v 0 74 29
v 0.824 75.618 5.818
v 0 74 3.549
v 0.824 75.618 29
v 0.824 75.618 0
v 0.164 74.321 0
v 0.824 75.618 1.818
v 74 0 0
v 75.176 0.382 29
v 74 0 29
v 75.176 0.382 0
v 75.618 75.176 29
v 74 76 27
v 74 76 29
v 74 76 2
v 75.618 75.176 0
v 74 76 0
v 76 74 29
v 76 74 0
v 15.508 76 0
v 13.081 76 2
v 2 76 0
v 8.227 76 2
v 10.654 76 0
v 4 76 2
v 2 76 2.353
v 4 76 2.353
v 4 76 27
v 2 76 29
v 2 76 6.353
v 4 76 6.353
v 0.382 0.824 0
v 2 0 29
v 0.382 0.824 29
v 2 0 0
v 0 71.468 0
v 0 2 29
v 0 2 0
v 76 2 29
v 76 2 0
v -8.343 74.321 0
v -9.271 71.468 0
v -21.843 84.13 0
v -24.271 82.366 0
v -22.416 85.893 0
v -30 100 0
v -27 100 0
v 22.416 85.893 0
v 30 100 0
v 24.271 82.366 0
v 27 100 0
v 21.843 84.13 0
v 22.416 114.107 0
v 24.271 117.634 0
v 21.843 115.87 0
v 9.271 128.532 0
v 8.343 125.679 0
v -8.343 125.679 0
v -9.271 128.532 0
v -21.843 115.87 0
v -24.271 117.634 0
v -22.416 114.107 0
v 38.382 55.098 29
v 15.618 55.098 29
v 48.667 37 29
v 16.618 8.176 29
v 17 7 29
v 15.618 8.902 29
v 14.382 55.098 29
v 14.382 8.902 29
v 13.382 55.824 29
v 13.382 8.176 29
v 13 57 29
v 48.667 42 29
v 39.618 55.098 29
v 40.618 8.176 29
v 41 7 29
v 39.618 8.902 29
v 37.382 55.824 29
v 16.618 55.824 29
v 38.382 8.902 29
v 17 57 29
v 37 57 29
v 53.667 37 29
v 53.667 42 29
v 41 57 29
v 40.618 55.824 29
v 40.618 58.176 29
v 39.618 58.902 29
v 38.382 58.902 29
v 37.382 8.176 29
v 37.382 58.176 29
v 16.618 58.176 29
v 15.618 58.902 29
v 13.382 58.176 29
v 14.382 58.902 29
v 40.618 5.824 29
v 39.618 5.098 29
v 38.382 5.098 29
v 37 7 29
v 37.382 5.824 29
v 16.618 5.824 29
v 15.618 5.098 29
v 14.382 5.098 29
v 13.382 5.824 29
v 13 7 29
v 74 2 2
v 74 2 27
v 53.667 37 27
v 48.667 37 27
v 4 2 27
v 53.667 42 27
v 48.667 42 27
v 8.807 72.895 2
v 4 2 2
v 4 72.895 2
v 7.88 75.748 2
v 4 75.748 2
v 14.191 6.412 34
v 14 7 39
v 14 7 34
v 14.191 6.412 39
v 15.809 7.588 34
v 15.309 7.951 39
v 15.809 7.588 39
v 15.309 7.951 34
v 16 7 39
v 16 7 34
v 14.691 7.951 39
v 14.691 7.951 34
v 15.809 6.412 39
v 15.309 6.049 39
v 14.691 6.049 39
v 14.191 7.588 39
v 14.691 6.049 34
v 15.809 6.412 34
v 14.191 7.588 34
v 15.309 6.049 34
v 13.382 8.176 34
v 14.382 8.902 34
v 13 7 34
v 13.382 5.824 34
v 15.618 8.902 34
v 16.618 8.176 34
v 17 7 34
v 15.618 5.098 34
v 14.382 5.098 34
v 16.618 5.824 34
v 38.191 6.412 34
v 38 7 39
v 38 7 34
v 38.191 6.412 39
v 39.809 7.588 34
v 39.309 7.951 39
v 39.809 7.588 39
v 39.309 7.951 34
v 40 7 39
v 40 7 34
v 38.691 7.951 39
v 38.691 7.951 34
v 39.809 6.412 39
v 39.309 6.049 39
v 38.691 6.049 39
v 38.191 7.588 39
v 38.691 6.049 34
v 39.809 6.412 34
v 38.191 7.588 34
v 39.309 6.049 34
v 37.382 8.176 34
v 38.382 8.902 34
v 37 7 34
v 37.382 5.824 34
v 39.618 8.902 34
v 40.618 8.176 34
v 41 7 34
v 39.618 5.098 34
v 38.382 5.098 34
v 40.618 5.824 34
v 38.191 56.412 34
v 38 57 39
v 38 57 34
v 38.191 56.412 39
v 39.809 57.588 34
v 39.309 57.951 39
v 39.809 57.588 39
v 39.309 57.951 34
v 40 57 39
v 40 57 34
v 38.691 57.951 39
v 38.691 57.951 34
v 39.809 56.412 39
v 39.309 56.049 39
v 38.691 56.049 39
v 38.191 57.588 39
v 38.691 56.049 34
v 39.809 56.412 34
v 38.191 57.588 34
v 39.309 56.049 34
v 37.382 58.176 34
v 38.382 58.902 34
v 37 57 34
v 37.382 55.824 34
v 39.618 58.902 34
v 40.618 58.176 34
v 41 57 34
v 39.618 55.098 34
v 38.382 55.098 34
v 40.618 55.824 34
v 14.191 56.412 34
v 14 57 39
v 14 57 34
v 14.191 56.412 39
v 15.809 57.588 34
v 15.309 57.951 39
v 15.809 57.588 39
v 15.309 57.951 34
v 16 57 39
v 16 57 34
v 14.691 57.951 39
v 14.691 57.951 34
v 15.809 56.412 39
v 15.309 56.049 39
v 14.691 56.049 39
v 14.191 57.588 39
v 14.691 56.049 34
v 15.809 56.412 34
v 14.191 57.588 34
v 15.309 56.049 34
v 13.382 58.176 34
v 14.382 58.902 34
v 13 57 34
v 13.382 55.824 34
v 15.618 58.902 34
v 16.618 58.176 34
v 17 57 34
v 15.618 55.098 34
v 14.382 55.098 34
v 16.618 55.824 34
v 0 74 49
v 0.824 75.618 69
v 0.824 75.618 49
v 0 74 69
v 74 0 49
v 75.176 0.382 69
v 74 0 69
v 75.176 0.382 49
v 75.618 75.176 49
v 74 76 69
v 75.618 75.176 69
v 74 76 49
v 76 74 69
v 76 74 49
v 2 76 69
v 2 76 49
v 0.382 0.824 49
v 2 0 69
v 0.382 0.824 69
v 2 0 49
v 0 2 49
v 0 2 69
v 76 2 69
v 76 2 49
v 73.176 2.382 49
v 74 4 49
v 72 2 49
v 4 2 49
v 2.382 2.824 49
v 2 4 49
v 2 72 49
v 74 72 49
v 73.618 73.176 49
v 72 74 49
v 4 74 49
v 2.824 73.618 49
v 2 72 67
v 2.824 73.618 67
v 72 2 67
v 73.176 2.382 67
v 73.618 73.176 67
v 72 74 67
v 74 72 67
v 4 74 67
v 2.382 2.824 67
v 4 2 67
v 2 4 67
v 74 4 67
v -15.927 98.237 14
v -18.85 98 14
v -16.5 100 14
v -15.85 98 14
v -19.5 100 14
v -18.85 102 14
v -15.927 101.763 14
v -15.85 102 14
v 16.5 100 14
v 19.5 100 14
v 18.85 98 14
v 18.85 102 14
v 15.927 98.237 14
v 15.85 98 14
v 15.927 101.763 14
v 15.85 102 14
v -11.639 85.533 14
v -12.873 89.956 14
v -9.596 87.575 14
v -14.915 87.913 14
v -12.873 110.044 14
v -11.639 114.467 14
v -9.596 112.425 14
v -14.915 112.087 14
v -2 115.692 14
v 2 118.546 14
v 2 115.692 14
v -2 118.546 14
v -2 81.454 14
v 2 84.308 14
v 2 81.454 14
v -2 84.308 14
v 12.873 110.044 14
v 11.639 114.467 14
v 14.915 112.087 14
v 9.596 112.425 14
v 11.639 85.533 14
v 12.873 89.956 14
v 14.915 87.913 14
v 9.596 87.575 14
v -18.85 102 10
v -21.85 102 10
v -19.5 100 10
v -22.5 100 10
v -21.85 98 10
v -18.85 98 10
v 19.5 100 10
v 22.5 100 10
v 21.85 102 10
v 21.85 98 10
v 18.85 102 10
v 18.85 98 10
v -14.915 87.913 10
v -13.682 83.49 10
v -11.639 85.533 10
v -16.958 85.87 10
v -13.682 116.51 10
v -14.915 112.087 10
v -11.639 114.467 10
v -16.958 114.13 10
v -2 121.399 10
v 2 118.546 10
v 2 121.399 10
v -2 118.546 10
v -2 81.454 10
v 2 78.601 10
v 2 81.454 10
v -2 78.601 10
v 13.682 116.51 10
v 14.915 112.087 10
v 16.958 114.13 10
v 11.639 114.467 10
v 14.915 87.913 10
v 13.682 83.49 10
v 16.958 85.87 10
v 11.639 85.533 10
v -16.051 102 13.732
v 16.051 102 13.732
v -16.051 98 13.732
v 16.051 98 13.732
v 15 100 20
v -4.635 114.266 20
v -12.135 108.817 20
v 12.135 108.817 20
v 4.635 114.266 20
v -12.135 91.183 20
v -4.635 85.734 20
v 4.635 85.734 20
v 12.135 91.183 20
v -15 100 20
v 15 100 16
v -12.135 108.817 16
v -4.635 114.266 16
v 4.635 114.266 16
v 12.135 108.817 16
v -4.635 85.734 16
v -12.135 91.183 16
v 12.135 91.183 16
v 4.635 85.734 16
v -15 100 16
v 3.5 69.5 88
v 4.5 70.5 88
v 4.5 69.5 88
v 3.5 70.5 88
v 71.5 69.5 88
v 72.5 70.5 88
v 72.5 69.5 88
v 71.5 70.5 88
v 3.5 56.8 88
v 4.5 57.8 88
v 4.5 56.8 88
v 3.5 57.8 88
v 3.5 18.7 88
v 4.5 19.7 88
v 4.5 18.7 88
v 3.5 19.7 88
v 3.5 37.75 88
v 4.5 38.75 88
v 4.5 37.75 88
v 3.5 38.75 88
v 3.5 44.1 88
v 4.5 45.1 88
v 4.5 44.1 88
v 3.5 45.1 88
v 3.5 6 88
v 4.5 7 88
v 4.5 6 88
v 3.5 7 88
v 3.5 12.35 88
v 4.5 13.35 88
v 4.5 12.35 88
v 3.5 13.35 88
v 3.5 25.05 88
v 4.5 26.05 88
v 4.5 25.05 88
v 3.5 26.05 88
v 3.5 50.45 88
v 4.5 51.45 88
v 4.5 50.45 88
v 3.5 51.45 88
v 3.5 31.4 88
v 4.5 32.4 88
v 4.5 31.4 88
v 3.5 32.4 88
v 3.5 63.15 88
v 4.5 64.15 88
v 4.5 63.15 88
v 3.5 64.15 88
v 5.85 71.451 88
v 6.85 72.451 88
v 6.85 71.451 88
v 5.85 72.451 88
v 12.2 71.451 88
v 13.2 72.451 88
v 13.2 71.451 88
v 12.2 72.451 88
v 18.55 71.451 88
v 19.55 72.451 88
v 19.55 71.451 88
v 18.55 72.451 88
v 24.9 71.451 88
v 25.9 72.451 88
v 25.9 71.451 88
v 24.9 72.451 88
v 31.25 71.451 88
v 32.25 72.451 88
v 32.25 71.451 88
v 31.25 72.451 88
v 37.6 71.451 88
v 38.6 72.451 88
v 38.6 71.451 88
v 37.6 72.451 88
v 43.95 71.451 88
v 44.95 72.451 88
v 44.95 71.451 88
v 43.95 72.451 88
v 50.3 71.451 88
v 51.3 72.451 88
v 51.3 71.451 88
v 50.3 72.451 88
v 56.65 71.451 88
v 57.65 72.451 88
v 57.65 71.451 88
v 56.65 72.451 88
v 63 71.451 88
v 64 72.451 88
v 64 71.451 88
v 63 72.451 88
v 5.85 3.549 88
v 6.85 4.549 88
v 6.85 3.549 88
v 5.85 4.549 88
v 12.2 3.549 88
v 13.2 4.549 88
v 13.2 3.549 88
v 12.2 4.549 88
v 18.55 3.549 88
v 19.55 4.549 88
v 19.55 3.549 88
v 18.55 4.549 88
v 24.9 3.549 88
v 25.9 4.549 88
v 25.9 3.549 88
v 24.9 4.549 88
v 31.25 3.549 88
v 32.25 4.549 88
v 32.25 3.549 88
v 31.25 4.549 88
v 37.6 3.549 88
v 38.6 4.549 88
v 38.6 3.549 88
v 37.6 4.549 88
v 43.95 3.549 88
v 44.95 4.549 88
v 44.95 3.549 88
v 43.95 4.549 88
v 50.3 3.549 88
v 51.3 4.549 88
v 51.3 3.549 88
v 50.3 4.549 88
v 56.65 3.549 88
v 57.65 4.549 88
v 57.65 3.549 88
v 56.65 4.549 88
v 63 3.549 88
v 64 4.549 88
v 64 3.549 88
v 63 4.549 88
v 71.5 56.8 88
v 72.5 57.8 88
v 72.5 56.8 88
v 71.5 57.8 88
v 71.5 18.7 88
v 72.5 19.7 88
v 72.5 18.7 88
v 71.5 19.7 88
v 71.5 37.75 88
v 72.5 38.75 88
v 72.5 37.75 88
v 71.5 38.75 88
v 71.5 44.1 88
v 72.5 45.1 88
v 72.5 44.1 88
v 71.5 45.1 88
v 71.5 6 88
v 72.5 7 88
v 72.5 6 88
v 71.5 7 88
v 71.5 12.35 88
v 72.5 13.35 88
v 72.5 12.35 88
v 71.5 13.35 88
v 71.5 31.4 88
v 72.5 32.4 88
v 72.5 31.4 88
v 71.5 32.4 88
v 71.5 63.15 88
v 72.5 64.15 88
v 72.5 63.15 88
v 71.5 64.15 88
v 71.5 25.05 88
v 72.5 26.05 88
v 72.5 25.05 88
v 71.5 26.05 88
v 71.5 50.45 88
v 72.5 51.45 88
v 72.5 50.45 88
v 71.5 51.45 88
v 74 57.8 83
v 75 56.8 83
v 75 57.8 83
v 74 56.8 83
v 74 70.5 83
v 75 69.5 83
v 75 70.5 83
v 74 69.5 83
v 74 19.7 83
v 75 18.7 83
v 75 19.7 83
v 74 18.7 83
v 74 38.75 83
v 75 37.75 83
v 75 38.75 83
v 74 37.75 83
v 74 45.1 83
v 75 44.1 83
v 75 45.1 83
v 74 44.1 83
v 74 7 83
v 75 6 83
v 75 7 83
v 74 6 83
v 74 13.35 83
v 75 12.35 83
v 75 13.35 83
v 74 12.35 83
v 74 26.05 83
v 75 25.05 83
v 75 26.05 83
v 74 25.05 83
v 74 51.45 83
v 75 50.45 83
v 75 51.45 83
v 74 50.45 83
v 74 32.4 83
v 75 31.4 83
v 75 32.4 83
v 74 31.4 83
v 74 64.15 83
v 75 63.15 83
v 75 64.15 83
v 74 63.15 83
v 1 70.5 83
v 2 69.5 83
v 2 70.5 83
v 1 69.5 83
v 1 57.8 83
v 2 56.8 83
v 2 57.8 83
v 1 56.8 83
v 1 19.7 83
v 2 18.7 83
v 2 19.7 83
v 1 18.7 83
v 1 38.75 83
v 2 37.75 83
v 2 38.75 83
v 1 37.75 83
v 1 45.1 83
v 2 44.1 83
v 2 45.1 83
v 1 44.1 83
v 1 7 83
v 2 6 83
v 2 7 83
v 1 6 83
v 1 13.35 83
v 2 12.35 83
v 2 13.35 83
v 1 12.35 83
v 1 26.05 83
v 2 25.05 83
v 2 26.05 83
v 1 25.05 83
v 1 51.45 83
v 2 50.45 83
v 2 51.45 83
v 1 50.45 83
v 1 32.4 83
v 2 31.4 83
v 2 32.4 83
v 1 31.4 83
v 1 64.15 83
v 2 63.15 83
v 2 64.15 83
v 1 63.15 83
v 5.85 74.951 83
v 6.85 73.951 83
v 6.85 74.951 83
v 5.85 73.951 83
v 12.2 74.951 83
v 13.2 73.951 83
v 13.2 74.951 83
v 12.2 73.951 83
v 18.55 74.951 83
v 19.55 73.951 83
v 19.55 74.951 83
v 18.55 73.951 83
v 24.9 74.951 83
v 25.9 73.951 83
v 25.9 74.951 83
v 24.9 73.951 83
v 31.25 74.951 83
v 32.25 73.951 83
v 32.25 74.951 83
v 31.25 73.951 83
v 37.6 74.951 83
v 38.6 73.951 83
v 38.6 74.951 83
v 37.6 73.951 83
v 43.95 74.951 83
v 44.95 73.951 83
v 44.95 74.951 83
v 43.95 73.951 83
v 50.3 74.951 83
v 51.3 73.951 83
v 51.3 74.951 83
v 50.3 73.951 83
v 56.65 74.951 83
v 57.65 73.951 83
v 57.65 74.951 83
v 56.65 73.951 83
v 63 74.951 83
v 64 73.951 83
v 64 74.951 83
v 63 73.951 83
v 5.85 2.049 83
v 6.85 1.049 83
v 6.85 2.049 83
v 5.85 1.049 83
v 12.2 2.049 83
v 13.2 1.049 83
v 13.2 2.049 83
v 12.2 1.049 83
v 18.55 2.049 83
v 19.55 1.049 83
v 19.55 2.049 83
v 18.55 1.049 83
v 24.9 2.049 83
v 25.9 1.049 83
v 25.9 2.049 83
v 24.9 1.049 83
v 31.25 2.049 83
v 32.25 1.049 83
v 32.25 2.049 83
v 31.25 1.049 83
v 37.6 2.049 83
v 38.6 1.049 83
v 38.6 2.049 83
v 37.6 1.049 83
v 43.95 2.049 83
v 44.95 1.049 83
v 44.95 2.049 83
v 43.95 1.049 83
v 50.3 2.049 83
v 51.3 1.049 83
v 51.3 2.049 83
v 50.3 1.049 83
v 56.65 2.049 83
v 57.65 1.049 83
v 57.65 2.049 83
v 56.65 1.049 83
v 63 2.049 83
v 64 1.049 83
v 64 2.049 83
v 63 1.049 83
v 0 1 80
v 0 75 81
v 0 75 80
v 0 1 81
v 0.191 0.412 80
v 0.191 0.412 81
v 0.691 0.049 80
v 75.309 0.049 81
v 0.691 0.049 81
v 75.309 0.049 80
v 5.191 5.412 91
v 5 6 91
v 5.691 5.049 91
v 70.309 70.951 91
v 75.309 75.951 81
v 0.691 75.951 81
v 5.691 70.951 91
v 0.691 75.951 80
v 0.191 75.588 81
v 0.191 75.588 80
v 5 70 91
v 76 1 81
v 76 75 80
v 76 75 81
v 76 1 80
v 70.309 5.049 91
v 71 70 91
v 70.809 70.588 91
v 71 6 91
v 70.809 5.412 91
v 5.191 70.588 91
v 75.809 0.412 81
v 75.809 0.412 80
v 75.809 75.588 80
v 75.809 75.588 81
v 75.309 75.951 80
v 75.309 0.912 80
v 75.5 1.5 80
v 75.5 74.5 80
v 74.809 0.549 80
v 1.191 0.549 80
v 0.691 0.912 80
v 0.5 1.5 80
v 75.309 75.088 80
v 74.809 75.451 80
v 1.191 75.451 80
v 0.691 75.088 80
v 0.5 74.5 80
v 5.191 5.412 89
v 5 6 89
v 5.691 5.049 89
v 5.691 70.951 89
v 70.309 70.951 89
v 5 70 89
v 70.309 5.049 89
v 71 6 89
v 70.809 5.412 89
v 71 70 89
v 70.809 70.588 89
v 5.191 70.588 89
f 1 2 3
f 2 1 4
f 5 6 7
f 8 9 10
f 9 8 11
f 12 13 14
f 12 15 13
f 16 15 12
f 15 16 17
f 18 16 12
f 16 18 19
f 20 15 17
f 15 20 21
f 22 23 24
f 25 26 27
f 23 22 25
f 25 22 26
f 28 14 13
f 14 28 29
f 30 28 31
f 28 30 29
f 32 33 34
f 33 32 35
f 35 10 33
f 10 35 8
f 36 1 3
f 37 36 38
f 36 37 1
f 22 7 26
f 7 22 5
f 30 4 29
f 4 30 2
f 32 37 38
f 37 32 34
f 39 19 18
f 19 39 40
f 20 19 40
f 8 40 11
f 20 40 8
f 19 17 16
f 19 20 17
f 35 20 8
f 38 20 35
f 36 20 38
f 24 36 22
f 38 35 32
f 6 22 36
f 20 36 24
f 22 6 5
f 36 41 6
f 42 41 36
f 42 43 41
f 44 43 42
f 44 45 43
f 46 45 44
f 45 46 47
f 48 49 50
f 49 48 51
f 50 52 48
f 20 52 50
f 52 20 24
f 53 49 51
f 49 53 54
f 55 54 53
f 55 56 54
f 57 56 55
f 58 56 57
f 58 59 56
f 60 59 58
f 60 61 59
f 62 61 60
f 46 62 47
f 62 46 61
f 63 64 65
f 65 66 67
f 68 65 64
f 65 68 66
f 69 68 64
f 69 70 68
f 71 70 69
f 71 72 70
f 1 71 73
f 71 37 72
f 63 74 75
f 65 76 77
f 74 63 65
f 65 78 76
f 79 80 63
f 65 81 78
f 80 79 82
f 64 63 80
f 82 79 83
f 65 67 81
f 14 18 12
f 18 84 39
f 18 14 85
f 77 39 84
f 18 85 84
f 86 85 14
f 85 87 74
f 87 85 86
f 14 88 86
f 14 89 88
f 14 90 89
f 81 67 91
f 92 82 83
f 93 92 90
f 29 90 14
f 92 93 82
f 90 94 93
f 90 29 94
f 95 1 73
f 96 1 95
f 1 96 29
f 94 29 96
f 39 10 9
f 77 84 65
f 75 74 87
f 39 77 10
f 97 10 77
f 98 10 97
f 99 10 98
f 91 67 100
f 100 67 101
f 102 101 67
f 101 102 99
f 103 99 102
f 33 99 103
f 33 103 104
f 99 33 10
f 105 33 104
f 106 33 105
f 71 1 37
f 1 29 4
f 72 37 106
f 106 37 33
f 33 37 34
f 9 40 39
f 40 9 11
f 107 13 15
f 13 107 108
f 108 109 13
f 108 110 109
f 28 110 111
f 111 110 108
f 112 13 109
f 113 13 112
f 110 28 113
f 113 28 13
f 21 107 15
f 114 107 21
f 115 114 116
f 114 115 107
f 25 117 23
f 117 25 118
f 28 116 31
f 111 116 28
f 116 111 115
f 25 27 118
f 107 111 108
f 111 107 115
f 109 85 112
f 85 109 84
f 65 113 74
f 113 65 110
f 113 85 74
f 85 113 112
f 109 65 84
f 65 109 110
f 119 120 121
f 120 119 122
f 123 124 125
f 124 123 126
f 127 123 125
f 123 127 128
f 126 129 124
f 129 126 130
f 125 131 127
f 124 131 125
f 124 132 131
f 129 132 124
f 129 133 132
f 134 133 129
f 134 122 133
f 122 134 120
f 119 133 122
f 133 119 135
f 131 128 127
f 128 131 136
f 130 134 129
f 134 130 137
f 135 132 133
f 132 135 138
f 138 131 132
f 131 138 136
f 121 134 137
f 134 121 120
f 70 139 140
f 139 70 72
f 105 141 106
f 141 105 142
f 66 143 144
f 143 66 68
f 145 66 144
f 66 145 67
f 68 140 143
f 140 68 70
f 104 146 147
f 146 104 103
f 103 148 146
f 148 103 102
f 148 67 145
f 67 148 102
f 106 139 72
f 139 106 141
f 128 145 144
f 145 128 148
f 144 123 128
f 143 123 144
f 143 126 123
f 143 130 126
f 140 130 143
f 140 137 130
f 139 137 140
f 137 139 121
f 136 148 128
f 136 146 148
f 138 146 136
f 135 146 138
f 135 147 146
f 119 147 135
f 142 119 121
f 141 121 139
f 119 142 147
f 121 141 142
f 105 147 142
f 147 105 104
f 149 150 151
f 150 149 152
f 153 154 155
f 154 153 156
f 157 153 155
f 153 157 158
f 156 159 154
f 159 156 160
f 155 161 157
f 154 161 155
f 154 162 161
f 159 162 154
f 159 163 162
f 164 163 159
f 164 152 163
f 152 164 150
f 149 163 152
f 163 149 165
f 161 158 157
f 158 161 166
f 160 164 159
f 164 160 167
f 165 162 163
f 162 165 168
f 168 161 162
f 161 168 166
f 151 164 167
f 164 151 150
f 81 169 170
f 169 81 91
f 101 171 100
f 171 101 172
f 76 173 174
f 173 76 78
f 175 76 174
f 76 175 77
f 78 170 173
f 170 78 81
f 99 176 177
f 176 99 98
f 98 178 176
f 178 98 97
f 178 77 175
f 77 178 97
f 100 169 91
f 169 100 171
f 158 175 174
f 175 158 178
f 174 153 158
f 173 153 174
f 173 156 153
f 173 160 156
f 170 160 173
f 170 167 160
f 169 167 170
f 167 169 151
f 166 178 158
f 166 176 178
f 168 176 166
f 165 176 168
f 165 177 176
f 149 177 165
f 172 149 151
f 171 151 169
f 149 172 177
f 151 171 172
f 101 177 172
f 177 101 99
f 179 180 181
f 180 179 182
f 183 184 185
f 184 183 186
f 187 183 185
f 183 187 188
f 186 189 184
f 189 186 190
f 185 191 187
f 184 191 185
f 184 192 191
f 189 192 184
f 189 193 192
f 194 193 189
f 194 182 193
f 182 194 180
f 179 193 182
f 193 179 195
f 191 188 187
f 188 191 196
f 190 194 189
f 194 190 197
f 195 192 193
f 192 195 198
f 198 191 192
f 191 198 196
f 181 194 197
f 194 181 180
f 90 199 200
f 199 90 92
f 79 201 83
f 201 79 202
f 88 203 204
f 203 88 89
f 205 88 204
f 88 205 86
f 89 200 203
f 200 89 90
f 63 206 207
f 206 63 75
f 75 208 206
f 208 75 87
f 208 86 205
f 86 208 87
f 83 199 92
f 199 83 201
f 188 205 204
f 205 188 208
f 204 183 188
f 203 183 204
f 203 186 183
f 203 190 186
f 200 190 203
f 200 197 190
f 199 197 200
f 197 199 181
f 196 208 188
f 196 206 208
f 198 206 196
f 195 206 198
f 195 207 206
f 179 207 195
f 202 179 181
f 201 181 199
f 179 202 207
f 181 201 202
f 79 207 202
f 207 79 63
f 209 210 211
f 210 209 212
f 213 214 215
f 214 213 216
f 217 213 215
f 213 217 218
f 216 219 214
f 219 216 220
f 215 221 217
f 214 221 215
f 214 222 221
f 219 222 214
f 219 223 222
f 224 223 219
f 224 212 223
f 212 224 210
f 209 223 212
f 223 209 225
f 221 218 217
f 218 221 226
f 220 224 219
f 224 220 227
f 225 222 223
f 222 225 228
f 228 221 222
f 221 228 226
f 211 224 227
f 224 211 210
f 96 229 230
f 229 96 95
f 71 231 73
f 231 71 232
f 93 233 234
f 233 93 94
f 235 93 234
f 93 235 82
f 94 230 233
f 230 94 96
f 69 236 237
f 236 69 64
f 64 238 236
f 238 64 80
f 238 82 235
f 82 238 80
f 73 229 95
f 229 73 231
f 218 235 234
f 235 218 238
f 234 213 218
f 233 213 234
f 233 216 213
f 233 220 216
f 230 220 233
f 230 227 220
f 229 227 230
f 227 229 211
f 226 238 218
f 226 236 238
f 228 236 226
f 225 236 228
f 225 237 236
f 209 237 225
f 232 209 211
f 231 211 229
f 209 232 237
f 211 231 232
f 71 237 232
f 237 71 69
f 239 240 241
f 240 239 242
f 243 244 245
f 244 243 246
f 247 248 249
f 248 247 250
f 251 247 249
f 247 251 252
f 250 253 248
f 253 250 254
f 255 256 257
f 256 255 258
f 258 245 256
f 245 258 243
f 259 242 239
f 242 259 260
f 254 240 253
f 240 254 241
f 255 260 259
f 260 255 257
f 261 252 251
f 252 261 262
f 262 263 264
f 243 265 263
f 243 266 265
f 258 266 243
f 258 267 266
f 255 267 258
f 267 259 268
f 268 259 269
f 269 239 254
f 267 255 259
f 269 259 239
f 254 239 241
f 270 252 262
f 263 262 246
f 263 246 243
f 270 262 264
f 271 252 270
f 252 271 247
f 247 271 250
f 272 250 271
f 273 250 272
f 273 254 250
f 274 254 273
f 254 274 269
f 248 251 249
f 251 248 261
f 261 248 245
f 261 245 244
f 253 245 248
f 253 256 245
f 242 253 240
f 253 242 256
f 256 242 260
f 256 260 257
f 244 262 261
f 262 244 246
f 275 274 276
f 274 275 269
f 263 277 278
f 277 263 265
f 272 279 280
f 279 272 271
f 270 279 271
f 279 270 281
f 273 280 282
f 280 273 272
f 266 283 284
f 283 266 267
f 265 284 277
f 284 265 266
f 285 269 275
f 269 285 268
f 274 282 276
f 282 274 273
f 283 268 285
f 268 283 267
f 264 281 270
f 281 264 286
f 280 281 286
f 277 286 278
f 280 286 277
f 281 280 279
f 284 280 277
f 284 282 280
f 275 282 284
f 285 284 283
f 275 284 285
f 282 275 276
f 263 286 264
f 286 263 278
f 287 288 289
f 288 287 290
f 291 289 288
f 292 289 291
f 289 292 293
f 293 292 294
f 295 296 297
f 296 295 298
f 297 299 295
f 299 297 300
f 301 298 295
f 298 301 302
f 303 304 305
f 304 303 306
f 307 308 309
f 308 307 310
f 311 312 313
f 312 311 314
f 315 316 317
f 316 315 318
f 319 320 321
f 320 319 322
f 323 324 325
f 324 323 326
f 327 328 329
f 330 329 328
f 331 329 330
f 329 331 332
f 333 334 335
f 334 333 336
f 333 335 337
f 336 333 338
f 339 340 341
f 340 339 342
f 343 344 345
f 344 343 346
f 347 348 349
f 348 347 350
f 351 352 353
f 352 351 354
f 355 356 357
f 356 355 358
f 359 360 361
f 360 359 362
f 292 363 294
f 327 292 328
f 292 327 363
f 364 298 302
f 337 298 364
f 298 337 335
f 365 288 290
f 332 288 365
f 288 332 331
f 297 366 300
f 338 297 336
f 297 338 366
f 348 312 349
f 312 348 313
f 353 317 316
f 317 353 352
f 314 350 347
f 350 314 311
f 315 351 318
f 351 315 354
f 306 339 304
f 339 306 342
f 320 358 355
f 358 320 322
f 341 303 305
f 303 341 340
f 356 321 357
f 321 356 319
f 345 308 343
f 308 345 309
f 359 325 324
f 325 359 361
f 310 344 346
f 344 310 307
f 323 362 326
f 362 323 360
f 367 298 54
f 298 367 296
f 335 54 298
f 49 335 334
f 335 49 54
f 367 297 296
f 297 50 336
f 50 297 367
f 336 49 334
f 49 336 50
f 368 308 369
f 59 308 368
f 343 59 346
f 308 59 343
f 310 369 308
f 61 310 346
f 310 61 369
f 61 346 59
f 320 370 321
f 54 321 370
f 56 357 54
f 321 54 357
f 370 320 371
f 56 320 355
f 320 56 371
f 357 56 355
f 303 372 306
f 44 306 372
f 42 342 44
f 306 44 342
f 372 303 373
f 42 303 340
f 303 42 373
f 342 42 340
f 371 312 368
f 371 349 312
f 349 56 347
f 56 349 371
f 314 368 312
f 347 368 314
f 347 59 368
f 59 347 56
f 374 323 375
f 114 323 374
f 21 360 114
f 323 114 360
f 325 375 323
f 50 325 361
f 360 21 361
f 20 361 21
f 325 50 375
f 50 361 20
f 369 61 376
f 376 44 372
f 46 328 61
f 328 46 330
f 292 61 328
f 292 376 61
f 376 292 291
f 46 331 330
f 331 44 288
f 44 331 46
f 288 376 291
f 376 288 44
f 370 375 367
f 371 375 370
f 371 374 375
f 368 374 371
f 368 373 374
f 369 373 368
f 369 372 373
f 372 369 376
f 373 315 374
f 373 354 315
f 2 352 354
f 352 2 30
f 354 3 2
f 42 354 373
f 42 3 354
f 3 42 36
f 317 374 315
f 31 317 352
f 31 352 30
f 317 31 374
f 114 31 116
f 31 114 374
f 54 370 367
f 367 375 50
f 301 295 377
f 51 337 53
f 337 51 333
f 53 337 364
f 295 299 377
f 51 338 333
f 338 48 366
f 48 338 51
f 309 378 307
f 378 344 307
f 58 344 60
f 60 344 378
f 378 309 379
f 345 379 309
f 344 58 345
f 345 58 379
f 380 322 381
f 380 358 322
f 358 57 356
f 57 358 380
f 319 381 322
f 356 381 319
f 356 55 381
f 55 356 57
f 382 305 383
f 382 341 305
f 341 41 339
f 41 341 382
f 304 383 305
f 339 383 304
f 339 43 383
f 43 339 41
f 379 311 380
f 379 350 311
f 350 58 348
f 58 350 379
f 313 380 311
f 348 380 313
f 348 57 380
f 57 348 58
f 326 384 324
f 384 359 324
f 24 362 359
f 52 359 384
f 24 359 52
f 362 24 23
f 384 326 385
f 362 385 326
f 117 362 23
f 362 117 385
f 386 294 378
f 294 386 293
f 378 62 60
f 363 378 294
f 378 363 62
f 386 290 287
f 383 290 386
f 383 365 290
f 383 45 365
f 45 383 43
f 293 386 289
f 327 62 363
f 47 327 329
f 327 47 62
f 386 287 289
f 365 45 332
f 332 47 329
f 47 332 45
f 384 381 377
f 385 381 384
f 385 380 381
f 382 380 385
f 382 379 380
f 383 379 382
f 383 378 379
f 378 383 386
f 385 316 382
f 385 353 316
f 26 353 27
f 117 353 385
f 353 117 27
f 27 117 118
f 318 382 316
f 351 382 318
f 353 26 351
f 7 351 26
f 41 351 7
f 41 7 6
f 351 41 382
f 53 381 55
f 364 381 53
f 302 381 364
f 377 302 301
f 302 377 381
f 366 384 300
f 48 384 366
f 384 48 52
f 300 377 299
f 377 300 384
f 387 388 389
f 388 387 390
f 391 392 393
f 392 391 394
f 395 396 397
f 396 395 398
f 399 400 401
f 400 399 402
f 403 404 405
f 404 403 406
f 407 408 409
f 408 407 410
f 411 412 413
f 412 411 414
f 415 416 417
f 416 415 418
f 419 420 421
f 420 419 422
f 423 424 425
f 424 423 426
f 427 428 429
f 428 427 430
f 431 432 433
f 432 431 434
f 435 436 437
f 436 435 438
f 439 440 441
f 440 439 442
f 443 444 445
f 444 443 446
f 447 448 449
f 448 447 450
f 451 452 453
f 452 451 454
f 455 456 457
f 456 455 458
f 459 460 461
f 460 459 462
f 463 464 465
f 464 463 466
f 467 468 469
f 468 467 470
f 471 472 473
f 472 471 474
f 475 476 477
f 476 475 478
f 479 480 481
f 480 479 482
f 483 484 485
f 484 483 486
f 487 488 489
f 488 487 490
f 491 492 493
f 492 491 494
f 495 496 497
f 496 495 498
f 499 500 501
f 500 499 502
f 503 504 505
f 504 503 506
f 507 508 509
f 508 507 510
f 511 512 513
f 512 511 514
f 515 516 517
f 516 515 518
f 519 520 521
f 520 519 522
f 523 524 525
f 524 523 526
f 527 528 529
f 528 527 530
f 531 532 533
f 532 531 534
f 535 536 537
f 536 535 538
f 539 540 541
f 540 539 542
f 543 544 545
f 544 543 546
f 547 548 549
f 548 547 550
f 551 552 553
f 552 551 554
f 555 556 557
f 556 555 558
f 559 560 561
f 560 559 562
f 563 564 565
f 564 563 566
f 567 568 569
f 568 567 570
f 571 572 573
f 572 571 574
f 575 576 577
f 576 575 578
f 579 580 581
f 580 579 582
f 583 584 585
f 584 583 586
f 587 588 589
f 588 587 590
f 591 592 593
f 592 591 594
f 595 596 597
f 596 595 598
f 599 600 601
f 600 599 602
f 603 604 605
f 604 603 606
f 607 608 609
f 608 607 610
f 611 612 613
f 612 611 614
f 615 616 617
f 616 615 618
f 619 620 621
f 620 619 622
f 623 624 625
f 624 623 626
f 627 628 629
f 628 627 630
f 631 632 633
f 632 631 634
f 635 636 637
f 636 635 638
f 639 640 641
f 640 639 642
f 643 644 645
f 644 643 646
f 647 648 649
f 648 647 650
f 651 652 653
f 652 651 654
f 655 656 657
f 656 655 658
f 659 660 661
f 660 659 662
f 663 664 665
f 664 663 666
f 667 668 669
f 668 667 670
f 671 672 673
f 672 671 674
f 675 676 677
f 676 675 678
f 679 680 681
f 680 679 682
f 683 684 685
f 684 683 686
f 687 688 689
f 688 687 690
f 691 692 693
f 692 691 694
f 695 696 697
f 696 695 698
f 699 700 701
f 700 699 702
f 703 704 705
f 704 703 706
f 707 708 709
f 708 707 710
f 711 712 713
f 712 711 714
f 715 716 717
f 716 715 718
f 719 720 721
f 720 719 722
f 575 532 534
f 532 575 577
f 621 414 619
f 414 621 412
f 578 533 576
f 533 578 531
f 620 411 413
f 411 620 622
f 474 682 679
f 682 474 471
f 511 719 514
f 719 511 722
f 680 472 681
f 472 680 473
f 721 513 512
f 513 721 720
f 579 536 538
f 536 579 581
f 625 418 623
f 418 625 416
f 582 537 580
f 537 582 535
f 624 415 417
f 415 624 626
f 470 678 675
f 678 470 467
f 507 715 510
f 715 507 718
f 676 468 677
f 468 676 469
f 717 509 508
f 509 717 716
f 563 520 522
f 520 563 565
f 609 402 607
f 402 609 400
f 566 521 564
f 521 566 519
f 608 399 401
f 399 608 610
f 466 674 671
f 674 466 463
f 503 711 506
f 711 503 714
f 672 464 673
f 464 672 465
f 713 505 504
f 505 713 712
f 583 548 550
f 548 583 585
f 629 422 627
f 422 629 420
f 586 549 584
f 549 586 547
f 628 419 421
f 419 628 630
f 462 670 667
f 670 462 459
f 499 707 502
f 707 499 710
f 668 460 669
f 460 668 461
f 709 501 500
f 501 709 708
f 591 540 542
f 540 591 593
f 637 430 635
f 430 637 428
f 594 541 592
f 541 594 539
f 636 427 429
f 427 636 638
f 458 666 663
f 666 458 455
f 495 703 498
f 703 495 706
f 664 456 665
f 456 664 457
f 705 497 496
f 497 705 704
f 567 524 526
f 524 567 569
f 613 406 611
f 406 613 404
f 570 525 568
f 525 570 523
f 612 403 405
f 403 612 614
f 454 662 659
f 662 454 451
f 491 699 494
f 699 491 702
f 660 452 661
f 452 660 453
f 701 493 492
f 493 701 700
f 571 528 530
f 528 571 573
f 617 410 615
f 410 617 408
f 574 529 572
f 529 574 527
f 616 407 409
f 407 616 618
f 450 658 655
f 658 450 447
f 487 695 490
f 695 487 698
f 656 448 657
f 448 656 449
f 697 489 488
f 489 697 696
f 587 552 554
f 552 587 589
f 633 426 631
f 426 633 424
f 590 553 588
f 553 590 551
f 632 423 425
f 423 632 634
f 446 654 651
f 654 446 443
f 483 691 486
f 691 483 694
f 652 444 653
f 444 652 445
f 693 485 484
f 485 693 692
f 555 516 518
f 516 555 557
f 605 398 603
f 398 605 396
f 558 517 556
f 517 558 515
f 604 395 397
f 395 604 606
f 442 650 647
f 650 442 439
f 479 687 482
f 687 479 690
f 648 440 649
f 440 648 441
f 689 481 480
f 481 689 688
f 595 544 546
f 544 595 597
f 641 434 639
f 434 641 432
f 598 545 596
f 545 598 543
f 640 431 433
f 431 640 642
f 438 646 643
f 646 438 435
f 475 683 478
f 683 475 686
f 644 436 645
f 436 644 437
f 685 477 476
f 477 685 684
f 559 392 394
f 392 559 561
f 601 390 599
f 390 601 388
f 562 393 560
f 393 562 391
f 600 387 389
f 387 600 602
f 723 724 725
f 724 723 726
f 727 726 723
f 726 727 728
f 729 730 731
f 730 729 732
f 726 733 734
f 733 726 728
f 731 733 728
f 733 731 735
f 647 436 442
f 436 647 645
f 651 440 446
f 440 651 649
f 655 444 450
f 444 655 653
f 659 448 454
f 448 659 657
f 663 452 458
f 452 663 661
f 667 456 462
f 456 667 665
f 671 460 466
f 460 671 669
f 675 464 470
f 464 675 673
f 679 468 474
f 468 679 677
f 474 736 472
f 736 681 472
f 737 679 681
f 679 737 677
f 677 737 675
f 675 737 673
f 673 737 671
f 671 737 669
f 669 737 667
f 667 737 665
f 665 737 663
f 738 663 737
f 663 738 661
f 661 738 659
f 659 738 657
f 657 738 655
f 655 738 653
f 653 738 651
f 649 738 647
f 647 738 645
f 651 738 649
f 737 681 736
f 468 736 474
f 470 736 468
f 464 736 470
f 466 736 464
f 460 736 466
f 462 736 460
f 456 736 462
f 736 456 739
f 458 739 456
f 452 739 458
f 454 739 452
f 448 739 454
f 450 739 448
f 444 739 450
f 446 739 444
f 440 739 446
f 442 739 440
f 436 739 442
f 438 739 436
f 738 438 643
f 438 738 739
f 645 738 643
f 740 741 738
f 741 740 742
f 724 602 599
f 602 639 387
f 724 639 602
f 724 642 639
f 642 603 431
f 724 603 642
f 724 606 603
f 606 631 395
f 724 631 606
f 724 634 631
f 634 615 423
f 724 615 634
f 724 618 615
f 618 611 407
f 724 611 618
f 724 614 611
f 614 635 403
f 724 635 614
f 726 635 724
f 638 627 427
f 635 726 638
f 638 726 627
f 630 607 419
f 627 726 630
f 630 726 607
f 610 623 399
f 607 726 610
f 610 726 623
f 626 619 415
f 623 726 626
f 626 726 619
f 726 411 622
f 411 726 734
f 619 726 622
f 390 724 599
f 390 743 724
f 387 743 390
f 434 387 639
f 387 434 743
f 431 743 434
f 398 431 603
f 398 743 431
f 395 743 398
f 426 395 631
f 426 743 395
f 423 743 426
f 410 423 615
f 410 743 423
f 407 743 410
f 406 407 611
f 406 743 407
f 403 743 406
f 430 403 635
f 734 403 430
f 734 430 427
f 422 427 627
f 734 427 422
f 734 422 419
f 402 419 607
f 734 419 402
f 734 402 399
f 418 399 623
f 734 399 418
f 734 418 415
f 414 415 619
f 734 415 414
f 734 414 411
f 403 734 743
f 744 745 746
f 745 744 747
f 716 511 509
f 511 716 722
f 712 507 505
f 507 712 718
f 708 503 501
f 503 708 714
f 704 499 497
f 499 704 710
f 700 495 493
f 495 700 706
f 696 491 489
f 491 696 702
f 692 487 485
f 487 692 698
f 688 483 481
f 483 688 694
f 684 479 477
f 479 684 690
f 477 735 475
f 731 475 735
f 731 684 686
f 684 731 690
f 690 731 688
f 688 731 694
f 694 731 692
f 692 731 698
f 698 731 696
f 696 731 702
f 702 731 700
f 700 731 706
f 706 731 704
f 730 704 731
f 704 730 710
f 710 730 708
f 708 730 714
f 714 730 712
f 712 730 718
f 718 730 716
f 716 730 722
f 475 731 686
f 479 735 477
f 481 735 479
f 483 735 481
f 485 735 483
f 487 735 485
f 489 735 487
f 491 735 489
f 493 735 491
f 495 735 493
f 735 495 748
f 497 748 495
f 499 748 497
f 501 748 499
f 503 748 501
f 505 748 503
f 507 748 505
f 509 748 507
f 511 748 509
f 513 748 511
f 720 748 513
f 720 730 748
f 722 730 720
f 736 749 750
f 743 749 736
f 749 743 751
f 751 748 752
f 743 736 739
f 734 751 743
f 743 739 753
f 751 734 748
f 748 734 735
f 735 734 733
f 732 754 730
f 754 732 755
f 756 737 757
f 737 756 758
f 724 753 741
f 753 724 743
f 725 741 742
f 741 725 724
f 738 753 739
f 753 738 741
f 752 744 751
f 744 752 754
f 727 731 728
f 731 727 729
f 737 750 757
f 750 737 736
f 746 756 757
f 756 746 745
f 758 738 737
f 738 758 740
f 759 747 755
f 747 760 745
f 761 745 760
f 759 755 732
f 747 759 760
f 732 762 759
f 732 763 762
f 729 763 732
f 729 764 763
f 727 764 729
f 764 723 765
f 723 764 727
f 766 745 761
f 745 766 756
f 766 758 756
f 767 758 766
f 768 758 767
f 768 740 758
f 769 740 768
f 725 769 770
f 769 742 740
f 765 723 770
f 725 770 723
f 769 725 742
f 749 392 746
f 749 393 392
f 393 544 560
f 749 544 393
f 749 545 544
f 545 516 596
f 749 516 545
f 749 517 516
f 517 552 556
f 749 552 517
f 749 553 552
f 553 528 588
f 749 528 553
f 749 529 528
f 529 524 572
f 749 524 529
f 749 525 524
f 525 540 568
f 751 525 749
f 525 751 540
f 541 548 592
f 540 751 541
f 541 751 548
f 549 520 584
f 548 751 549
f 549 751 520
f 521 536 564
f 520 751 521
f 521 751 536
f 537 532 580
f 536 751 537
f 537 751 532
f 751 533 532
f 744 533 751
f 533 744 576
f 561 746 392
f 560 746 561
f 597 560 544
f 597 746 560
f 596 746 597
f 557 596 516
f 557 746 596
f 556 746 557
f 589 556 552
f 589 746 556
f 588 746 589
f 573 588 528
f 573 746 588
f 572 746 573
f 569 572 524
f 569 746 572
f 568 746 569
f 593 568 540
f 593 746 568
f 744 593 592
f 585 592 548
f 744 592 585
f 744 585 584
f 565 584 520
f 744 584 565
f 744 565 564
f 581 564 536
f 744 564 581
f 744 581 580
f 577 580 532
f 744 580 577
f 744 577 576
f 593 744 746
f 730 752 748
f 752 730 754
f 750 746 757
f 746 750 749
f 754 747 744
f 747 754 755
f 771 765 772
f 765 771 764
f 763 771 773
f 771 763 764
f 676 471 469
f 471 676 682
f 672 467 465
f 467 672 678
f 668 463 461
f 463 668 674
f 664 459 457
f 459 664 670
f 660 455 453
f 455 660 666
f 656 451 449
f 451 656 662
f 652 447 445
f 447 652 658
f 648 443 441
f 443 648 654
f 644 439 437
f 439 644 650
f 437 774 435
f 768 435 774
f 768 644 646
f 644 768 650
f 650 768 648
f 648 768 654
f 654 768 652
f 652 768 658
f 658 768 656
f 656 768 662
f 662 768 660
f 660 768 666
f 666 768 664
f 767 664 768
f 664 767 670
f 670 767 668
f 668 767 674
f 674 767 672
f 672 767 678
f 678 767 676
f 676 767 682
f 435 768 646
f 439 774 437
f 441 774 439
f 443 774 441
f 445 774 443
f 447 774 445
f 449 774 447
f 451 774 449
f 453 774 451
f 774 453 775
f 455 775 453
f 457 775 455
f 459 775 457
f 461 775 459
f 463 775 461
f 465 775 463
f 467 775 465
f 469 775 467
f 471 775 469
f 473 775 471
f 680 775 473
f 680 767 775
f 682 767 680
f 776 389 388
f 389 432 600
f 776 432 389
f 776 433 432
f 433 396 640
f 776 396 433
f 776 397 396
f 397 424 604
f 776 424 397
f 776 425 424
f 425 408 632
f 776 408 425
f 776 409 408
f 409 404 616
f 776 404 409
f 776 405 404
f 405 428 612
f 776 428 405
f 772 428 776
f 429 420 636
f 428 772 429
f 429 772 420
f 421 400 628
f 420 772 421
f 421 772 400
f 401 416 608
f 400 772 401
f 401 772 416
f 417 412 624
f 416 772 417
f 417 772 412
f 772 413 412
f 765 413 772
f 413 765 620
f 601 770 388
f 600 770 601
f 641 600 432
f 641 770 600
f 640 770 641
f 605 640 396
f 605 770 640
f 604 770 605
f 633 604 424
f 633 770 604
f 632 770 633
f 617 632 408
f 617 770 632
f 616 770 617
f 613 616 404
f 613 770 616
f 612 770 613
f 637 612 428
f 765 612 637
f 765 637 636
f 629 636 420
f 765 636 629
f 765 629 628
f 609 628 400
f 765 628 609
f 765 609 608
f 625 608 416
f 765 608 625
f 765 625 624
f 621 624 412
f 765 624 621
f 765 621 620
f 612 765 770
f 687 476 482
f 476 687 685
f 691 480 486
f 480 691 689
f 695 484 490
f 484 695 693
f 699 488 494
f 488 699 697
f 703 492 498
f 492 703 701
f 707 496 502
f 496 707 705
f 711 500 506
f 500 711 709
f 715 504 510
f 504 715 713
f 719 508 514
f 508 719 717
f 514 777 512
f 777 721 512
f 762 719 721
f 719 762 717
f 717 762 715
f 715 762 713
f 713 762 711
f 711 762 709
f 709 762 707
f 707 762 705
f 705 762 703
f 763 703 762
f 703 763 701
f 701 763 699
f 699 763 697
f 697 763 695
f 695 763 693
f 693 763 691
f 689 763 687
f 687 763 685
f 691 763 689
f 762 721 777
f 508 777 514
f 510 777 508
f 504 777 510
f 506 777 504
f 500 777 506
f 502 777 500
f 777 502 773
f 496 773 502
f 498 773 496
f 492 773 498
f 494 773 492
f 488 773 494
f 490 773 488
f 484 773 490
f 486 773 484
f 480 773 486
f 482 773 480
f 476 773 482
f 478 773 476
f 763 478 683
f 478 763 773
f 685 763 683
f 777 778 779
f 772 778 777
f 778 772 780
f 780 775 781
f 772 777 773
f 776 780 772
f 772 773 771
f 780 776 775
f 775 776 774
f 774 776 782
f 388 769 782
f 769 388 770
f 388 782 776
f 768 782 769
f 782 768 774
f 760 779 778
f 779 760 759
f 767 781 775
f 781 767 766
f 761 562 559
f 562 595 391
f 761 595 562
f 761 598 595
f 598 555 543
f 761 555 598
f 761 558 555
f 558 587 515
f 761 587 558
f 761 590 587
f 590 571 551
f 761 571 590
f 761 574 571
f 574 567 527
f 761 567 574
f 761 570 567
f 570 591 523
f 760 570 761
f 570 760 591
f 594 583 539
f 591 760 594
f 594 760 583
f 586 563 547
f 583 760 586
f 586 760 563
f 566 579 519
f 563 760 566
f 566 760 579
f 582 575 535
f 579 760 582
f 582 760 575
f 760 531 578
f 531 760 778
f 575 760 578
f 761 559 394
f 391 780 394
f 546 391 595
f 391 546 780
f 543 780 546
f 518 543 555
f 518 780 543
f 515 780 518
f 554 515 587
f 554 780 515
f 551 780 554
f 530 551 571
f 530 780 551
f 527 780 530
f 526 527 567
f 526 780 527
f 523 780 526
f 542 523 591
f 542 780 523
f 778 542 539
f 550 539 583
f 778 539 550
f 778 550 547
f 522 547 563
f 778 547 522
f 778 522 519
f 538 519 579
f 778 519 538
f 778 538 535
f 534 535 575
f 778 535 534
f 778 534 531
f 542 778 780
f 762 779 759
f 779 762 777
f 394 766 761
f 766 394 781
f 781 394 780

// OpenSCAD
$fn = 10;
// size of battery module
bat = [70, 70, 25];

nodemcu_size = [30, 56];
// 2mm border (for each side)
border = 2;
// cap height
cap = [0, 20, 0];

// for debug purpose
cap_offset = 20;

module cpu_pilar(x, y) {
  color("blue")
  translate([x, y, 0])
  union() {
    cylinder(h=10, r=1, center=false);
    cylinder(h=5, r=2, center=false);
  }
}
module battery_bed() {
difference() {
      // make nice round casing
      linear_extrude(bat.z + border*2)
      offset(r = border)
      square(bat.x + border);
        
      translate([border, 0, border])
      cube(bat + [0, 100, 0]);
      // hole for power cords
      // ensure we don't clip bottom
      translate(bat - [bat.x/3, bat.y/2, 0])
      cube([5, 5, 1000]);
    }
}

module cpu_bed() {
  union() {
      // just for preview
      //square(nodemcu_size);
      // support pilars at corners
      cpu_pilar(3, 3);
      cpu_pilar(nodemcu_size.x - 3, 3);
      cpu_pilar(nodemcu_size.x - 3, nodemcu_size.y - 3);
      cpu_pilar(3, nodemcu_size.y - 3);
    }
}

module cpu_cap() {
            // cap on cpu
        difference() {
        color("purple")
        linear_extrude(cap.y)
        offset(r = border)
        square(bat.x + border);
        color("magenta")
        translate([border, border, -border])
        linear_extrude(cap.y)
        offset(r = border)
        square(bat.x - border);
        }
}

if (true) {
// "base" shift so we are aligned to (0,0)
translate([border, border, 0])
union() {
    battery_bed();
    // CPU bed shift to batter_bed TOP
    translate([10, border, bat.z + border*2])
    cpu_bed();
    
    // built on top of battery bed
    translate([0, 0, cap_offset + bat.z + border*2])
    union() {
        cpu_cap();
        // sensor tower
        //translate([bat.x, bat.y, 0]/2 + [0, 0, 20])
        //difference() {
        //    tower = [10, 30];
        //    cylinder(tower.y, r=tower.x, center=false);
        //    cylinder(h=tower.y*3, r=6, center=true);
        //}
    }
}
translate([0, 100, 0])
union() {
    difference() {
    cylinder(20, 30, 15);
    translate([0, 0, 10])
    union() {
    grand_cross(4);
    rotate([0, 0, 45])
    grand_cross(4);
    }
    translate([0, 0, -4])
    cylinder(20, 30, 15);
}
}
}

function vec_star_vec(a, b) =
    [a.x * b.x, a.y * b.y, a.z * b.z];

module rounded_box(size, radius){
    height = size.z;
    points = [
    [0,0,0], [1,0,0], [0,1,0], [1,1,0]
    ];
    size = [
    size.x - radius*2,
    size.y - radius*2,
    size.z
    ];
    //scale(size)
    hull(){
        for (p = points){
            translate(vec_star_vec(p, size))
            translate([radius, radius, 0])
            cylinder(r=radius, h=height);
        }
    }
}

translate([0, 0, 80])
difference() {
    s_b = [bat.x+border*3, bat.y+border*3];
    s_t = s_b - [10, 10];
    rounded_thing(s_b, s_t, 10);
    translate([0, 0, -2])
    rounded_thing(s_b, s_t, 10);
    hole_start = (s_b - s_t)/2;
    hole_end = s_t + hole_start/2;
    steps = 10;
    step = (hole_end - hole_start)/steps;
    color("blue", 0.4)
    union() {
    for (i = [0:steps]) {
translate([-25, 1+hole_start.x+i*step.x, 3])
cube([100, 1, 5]);
rotate([0, 0, 90])
translate([0, -70 + 1+hole_start.x+i*step.x, 3])
cube([100, 1, 5]);
}}

}
   // translate([7, 7, 10])
    //cube([13, 13, 1]);
// available volue draw last to ensure no shadowing is happening
//color("red", 0.1)
//cube([30, 30, 15]);

module rounded_thing(bottom, top, height) {
hull() {
rounded_box([bottom.x, bottom.y, 1], 1);
translate([bottom.x - top.x, bottom.y - top.y, 0] / 2 + [0, 0, height] )
rounded_box([top.x, top.y, 1], 1);
}
}
module grand_cross(size) {
    translate([-50, -size/2, 0])
    cube([100, size, size]);
    translate([-size/2, -50, 0])
    cube([size, 100, size]);
}
